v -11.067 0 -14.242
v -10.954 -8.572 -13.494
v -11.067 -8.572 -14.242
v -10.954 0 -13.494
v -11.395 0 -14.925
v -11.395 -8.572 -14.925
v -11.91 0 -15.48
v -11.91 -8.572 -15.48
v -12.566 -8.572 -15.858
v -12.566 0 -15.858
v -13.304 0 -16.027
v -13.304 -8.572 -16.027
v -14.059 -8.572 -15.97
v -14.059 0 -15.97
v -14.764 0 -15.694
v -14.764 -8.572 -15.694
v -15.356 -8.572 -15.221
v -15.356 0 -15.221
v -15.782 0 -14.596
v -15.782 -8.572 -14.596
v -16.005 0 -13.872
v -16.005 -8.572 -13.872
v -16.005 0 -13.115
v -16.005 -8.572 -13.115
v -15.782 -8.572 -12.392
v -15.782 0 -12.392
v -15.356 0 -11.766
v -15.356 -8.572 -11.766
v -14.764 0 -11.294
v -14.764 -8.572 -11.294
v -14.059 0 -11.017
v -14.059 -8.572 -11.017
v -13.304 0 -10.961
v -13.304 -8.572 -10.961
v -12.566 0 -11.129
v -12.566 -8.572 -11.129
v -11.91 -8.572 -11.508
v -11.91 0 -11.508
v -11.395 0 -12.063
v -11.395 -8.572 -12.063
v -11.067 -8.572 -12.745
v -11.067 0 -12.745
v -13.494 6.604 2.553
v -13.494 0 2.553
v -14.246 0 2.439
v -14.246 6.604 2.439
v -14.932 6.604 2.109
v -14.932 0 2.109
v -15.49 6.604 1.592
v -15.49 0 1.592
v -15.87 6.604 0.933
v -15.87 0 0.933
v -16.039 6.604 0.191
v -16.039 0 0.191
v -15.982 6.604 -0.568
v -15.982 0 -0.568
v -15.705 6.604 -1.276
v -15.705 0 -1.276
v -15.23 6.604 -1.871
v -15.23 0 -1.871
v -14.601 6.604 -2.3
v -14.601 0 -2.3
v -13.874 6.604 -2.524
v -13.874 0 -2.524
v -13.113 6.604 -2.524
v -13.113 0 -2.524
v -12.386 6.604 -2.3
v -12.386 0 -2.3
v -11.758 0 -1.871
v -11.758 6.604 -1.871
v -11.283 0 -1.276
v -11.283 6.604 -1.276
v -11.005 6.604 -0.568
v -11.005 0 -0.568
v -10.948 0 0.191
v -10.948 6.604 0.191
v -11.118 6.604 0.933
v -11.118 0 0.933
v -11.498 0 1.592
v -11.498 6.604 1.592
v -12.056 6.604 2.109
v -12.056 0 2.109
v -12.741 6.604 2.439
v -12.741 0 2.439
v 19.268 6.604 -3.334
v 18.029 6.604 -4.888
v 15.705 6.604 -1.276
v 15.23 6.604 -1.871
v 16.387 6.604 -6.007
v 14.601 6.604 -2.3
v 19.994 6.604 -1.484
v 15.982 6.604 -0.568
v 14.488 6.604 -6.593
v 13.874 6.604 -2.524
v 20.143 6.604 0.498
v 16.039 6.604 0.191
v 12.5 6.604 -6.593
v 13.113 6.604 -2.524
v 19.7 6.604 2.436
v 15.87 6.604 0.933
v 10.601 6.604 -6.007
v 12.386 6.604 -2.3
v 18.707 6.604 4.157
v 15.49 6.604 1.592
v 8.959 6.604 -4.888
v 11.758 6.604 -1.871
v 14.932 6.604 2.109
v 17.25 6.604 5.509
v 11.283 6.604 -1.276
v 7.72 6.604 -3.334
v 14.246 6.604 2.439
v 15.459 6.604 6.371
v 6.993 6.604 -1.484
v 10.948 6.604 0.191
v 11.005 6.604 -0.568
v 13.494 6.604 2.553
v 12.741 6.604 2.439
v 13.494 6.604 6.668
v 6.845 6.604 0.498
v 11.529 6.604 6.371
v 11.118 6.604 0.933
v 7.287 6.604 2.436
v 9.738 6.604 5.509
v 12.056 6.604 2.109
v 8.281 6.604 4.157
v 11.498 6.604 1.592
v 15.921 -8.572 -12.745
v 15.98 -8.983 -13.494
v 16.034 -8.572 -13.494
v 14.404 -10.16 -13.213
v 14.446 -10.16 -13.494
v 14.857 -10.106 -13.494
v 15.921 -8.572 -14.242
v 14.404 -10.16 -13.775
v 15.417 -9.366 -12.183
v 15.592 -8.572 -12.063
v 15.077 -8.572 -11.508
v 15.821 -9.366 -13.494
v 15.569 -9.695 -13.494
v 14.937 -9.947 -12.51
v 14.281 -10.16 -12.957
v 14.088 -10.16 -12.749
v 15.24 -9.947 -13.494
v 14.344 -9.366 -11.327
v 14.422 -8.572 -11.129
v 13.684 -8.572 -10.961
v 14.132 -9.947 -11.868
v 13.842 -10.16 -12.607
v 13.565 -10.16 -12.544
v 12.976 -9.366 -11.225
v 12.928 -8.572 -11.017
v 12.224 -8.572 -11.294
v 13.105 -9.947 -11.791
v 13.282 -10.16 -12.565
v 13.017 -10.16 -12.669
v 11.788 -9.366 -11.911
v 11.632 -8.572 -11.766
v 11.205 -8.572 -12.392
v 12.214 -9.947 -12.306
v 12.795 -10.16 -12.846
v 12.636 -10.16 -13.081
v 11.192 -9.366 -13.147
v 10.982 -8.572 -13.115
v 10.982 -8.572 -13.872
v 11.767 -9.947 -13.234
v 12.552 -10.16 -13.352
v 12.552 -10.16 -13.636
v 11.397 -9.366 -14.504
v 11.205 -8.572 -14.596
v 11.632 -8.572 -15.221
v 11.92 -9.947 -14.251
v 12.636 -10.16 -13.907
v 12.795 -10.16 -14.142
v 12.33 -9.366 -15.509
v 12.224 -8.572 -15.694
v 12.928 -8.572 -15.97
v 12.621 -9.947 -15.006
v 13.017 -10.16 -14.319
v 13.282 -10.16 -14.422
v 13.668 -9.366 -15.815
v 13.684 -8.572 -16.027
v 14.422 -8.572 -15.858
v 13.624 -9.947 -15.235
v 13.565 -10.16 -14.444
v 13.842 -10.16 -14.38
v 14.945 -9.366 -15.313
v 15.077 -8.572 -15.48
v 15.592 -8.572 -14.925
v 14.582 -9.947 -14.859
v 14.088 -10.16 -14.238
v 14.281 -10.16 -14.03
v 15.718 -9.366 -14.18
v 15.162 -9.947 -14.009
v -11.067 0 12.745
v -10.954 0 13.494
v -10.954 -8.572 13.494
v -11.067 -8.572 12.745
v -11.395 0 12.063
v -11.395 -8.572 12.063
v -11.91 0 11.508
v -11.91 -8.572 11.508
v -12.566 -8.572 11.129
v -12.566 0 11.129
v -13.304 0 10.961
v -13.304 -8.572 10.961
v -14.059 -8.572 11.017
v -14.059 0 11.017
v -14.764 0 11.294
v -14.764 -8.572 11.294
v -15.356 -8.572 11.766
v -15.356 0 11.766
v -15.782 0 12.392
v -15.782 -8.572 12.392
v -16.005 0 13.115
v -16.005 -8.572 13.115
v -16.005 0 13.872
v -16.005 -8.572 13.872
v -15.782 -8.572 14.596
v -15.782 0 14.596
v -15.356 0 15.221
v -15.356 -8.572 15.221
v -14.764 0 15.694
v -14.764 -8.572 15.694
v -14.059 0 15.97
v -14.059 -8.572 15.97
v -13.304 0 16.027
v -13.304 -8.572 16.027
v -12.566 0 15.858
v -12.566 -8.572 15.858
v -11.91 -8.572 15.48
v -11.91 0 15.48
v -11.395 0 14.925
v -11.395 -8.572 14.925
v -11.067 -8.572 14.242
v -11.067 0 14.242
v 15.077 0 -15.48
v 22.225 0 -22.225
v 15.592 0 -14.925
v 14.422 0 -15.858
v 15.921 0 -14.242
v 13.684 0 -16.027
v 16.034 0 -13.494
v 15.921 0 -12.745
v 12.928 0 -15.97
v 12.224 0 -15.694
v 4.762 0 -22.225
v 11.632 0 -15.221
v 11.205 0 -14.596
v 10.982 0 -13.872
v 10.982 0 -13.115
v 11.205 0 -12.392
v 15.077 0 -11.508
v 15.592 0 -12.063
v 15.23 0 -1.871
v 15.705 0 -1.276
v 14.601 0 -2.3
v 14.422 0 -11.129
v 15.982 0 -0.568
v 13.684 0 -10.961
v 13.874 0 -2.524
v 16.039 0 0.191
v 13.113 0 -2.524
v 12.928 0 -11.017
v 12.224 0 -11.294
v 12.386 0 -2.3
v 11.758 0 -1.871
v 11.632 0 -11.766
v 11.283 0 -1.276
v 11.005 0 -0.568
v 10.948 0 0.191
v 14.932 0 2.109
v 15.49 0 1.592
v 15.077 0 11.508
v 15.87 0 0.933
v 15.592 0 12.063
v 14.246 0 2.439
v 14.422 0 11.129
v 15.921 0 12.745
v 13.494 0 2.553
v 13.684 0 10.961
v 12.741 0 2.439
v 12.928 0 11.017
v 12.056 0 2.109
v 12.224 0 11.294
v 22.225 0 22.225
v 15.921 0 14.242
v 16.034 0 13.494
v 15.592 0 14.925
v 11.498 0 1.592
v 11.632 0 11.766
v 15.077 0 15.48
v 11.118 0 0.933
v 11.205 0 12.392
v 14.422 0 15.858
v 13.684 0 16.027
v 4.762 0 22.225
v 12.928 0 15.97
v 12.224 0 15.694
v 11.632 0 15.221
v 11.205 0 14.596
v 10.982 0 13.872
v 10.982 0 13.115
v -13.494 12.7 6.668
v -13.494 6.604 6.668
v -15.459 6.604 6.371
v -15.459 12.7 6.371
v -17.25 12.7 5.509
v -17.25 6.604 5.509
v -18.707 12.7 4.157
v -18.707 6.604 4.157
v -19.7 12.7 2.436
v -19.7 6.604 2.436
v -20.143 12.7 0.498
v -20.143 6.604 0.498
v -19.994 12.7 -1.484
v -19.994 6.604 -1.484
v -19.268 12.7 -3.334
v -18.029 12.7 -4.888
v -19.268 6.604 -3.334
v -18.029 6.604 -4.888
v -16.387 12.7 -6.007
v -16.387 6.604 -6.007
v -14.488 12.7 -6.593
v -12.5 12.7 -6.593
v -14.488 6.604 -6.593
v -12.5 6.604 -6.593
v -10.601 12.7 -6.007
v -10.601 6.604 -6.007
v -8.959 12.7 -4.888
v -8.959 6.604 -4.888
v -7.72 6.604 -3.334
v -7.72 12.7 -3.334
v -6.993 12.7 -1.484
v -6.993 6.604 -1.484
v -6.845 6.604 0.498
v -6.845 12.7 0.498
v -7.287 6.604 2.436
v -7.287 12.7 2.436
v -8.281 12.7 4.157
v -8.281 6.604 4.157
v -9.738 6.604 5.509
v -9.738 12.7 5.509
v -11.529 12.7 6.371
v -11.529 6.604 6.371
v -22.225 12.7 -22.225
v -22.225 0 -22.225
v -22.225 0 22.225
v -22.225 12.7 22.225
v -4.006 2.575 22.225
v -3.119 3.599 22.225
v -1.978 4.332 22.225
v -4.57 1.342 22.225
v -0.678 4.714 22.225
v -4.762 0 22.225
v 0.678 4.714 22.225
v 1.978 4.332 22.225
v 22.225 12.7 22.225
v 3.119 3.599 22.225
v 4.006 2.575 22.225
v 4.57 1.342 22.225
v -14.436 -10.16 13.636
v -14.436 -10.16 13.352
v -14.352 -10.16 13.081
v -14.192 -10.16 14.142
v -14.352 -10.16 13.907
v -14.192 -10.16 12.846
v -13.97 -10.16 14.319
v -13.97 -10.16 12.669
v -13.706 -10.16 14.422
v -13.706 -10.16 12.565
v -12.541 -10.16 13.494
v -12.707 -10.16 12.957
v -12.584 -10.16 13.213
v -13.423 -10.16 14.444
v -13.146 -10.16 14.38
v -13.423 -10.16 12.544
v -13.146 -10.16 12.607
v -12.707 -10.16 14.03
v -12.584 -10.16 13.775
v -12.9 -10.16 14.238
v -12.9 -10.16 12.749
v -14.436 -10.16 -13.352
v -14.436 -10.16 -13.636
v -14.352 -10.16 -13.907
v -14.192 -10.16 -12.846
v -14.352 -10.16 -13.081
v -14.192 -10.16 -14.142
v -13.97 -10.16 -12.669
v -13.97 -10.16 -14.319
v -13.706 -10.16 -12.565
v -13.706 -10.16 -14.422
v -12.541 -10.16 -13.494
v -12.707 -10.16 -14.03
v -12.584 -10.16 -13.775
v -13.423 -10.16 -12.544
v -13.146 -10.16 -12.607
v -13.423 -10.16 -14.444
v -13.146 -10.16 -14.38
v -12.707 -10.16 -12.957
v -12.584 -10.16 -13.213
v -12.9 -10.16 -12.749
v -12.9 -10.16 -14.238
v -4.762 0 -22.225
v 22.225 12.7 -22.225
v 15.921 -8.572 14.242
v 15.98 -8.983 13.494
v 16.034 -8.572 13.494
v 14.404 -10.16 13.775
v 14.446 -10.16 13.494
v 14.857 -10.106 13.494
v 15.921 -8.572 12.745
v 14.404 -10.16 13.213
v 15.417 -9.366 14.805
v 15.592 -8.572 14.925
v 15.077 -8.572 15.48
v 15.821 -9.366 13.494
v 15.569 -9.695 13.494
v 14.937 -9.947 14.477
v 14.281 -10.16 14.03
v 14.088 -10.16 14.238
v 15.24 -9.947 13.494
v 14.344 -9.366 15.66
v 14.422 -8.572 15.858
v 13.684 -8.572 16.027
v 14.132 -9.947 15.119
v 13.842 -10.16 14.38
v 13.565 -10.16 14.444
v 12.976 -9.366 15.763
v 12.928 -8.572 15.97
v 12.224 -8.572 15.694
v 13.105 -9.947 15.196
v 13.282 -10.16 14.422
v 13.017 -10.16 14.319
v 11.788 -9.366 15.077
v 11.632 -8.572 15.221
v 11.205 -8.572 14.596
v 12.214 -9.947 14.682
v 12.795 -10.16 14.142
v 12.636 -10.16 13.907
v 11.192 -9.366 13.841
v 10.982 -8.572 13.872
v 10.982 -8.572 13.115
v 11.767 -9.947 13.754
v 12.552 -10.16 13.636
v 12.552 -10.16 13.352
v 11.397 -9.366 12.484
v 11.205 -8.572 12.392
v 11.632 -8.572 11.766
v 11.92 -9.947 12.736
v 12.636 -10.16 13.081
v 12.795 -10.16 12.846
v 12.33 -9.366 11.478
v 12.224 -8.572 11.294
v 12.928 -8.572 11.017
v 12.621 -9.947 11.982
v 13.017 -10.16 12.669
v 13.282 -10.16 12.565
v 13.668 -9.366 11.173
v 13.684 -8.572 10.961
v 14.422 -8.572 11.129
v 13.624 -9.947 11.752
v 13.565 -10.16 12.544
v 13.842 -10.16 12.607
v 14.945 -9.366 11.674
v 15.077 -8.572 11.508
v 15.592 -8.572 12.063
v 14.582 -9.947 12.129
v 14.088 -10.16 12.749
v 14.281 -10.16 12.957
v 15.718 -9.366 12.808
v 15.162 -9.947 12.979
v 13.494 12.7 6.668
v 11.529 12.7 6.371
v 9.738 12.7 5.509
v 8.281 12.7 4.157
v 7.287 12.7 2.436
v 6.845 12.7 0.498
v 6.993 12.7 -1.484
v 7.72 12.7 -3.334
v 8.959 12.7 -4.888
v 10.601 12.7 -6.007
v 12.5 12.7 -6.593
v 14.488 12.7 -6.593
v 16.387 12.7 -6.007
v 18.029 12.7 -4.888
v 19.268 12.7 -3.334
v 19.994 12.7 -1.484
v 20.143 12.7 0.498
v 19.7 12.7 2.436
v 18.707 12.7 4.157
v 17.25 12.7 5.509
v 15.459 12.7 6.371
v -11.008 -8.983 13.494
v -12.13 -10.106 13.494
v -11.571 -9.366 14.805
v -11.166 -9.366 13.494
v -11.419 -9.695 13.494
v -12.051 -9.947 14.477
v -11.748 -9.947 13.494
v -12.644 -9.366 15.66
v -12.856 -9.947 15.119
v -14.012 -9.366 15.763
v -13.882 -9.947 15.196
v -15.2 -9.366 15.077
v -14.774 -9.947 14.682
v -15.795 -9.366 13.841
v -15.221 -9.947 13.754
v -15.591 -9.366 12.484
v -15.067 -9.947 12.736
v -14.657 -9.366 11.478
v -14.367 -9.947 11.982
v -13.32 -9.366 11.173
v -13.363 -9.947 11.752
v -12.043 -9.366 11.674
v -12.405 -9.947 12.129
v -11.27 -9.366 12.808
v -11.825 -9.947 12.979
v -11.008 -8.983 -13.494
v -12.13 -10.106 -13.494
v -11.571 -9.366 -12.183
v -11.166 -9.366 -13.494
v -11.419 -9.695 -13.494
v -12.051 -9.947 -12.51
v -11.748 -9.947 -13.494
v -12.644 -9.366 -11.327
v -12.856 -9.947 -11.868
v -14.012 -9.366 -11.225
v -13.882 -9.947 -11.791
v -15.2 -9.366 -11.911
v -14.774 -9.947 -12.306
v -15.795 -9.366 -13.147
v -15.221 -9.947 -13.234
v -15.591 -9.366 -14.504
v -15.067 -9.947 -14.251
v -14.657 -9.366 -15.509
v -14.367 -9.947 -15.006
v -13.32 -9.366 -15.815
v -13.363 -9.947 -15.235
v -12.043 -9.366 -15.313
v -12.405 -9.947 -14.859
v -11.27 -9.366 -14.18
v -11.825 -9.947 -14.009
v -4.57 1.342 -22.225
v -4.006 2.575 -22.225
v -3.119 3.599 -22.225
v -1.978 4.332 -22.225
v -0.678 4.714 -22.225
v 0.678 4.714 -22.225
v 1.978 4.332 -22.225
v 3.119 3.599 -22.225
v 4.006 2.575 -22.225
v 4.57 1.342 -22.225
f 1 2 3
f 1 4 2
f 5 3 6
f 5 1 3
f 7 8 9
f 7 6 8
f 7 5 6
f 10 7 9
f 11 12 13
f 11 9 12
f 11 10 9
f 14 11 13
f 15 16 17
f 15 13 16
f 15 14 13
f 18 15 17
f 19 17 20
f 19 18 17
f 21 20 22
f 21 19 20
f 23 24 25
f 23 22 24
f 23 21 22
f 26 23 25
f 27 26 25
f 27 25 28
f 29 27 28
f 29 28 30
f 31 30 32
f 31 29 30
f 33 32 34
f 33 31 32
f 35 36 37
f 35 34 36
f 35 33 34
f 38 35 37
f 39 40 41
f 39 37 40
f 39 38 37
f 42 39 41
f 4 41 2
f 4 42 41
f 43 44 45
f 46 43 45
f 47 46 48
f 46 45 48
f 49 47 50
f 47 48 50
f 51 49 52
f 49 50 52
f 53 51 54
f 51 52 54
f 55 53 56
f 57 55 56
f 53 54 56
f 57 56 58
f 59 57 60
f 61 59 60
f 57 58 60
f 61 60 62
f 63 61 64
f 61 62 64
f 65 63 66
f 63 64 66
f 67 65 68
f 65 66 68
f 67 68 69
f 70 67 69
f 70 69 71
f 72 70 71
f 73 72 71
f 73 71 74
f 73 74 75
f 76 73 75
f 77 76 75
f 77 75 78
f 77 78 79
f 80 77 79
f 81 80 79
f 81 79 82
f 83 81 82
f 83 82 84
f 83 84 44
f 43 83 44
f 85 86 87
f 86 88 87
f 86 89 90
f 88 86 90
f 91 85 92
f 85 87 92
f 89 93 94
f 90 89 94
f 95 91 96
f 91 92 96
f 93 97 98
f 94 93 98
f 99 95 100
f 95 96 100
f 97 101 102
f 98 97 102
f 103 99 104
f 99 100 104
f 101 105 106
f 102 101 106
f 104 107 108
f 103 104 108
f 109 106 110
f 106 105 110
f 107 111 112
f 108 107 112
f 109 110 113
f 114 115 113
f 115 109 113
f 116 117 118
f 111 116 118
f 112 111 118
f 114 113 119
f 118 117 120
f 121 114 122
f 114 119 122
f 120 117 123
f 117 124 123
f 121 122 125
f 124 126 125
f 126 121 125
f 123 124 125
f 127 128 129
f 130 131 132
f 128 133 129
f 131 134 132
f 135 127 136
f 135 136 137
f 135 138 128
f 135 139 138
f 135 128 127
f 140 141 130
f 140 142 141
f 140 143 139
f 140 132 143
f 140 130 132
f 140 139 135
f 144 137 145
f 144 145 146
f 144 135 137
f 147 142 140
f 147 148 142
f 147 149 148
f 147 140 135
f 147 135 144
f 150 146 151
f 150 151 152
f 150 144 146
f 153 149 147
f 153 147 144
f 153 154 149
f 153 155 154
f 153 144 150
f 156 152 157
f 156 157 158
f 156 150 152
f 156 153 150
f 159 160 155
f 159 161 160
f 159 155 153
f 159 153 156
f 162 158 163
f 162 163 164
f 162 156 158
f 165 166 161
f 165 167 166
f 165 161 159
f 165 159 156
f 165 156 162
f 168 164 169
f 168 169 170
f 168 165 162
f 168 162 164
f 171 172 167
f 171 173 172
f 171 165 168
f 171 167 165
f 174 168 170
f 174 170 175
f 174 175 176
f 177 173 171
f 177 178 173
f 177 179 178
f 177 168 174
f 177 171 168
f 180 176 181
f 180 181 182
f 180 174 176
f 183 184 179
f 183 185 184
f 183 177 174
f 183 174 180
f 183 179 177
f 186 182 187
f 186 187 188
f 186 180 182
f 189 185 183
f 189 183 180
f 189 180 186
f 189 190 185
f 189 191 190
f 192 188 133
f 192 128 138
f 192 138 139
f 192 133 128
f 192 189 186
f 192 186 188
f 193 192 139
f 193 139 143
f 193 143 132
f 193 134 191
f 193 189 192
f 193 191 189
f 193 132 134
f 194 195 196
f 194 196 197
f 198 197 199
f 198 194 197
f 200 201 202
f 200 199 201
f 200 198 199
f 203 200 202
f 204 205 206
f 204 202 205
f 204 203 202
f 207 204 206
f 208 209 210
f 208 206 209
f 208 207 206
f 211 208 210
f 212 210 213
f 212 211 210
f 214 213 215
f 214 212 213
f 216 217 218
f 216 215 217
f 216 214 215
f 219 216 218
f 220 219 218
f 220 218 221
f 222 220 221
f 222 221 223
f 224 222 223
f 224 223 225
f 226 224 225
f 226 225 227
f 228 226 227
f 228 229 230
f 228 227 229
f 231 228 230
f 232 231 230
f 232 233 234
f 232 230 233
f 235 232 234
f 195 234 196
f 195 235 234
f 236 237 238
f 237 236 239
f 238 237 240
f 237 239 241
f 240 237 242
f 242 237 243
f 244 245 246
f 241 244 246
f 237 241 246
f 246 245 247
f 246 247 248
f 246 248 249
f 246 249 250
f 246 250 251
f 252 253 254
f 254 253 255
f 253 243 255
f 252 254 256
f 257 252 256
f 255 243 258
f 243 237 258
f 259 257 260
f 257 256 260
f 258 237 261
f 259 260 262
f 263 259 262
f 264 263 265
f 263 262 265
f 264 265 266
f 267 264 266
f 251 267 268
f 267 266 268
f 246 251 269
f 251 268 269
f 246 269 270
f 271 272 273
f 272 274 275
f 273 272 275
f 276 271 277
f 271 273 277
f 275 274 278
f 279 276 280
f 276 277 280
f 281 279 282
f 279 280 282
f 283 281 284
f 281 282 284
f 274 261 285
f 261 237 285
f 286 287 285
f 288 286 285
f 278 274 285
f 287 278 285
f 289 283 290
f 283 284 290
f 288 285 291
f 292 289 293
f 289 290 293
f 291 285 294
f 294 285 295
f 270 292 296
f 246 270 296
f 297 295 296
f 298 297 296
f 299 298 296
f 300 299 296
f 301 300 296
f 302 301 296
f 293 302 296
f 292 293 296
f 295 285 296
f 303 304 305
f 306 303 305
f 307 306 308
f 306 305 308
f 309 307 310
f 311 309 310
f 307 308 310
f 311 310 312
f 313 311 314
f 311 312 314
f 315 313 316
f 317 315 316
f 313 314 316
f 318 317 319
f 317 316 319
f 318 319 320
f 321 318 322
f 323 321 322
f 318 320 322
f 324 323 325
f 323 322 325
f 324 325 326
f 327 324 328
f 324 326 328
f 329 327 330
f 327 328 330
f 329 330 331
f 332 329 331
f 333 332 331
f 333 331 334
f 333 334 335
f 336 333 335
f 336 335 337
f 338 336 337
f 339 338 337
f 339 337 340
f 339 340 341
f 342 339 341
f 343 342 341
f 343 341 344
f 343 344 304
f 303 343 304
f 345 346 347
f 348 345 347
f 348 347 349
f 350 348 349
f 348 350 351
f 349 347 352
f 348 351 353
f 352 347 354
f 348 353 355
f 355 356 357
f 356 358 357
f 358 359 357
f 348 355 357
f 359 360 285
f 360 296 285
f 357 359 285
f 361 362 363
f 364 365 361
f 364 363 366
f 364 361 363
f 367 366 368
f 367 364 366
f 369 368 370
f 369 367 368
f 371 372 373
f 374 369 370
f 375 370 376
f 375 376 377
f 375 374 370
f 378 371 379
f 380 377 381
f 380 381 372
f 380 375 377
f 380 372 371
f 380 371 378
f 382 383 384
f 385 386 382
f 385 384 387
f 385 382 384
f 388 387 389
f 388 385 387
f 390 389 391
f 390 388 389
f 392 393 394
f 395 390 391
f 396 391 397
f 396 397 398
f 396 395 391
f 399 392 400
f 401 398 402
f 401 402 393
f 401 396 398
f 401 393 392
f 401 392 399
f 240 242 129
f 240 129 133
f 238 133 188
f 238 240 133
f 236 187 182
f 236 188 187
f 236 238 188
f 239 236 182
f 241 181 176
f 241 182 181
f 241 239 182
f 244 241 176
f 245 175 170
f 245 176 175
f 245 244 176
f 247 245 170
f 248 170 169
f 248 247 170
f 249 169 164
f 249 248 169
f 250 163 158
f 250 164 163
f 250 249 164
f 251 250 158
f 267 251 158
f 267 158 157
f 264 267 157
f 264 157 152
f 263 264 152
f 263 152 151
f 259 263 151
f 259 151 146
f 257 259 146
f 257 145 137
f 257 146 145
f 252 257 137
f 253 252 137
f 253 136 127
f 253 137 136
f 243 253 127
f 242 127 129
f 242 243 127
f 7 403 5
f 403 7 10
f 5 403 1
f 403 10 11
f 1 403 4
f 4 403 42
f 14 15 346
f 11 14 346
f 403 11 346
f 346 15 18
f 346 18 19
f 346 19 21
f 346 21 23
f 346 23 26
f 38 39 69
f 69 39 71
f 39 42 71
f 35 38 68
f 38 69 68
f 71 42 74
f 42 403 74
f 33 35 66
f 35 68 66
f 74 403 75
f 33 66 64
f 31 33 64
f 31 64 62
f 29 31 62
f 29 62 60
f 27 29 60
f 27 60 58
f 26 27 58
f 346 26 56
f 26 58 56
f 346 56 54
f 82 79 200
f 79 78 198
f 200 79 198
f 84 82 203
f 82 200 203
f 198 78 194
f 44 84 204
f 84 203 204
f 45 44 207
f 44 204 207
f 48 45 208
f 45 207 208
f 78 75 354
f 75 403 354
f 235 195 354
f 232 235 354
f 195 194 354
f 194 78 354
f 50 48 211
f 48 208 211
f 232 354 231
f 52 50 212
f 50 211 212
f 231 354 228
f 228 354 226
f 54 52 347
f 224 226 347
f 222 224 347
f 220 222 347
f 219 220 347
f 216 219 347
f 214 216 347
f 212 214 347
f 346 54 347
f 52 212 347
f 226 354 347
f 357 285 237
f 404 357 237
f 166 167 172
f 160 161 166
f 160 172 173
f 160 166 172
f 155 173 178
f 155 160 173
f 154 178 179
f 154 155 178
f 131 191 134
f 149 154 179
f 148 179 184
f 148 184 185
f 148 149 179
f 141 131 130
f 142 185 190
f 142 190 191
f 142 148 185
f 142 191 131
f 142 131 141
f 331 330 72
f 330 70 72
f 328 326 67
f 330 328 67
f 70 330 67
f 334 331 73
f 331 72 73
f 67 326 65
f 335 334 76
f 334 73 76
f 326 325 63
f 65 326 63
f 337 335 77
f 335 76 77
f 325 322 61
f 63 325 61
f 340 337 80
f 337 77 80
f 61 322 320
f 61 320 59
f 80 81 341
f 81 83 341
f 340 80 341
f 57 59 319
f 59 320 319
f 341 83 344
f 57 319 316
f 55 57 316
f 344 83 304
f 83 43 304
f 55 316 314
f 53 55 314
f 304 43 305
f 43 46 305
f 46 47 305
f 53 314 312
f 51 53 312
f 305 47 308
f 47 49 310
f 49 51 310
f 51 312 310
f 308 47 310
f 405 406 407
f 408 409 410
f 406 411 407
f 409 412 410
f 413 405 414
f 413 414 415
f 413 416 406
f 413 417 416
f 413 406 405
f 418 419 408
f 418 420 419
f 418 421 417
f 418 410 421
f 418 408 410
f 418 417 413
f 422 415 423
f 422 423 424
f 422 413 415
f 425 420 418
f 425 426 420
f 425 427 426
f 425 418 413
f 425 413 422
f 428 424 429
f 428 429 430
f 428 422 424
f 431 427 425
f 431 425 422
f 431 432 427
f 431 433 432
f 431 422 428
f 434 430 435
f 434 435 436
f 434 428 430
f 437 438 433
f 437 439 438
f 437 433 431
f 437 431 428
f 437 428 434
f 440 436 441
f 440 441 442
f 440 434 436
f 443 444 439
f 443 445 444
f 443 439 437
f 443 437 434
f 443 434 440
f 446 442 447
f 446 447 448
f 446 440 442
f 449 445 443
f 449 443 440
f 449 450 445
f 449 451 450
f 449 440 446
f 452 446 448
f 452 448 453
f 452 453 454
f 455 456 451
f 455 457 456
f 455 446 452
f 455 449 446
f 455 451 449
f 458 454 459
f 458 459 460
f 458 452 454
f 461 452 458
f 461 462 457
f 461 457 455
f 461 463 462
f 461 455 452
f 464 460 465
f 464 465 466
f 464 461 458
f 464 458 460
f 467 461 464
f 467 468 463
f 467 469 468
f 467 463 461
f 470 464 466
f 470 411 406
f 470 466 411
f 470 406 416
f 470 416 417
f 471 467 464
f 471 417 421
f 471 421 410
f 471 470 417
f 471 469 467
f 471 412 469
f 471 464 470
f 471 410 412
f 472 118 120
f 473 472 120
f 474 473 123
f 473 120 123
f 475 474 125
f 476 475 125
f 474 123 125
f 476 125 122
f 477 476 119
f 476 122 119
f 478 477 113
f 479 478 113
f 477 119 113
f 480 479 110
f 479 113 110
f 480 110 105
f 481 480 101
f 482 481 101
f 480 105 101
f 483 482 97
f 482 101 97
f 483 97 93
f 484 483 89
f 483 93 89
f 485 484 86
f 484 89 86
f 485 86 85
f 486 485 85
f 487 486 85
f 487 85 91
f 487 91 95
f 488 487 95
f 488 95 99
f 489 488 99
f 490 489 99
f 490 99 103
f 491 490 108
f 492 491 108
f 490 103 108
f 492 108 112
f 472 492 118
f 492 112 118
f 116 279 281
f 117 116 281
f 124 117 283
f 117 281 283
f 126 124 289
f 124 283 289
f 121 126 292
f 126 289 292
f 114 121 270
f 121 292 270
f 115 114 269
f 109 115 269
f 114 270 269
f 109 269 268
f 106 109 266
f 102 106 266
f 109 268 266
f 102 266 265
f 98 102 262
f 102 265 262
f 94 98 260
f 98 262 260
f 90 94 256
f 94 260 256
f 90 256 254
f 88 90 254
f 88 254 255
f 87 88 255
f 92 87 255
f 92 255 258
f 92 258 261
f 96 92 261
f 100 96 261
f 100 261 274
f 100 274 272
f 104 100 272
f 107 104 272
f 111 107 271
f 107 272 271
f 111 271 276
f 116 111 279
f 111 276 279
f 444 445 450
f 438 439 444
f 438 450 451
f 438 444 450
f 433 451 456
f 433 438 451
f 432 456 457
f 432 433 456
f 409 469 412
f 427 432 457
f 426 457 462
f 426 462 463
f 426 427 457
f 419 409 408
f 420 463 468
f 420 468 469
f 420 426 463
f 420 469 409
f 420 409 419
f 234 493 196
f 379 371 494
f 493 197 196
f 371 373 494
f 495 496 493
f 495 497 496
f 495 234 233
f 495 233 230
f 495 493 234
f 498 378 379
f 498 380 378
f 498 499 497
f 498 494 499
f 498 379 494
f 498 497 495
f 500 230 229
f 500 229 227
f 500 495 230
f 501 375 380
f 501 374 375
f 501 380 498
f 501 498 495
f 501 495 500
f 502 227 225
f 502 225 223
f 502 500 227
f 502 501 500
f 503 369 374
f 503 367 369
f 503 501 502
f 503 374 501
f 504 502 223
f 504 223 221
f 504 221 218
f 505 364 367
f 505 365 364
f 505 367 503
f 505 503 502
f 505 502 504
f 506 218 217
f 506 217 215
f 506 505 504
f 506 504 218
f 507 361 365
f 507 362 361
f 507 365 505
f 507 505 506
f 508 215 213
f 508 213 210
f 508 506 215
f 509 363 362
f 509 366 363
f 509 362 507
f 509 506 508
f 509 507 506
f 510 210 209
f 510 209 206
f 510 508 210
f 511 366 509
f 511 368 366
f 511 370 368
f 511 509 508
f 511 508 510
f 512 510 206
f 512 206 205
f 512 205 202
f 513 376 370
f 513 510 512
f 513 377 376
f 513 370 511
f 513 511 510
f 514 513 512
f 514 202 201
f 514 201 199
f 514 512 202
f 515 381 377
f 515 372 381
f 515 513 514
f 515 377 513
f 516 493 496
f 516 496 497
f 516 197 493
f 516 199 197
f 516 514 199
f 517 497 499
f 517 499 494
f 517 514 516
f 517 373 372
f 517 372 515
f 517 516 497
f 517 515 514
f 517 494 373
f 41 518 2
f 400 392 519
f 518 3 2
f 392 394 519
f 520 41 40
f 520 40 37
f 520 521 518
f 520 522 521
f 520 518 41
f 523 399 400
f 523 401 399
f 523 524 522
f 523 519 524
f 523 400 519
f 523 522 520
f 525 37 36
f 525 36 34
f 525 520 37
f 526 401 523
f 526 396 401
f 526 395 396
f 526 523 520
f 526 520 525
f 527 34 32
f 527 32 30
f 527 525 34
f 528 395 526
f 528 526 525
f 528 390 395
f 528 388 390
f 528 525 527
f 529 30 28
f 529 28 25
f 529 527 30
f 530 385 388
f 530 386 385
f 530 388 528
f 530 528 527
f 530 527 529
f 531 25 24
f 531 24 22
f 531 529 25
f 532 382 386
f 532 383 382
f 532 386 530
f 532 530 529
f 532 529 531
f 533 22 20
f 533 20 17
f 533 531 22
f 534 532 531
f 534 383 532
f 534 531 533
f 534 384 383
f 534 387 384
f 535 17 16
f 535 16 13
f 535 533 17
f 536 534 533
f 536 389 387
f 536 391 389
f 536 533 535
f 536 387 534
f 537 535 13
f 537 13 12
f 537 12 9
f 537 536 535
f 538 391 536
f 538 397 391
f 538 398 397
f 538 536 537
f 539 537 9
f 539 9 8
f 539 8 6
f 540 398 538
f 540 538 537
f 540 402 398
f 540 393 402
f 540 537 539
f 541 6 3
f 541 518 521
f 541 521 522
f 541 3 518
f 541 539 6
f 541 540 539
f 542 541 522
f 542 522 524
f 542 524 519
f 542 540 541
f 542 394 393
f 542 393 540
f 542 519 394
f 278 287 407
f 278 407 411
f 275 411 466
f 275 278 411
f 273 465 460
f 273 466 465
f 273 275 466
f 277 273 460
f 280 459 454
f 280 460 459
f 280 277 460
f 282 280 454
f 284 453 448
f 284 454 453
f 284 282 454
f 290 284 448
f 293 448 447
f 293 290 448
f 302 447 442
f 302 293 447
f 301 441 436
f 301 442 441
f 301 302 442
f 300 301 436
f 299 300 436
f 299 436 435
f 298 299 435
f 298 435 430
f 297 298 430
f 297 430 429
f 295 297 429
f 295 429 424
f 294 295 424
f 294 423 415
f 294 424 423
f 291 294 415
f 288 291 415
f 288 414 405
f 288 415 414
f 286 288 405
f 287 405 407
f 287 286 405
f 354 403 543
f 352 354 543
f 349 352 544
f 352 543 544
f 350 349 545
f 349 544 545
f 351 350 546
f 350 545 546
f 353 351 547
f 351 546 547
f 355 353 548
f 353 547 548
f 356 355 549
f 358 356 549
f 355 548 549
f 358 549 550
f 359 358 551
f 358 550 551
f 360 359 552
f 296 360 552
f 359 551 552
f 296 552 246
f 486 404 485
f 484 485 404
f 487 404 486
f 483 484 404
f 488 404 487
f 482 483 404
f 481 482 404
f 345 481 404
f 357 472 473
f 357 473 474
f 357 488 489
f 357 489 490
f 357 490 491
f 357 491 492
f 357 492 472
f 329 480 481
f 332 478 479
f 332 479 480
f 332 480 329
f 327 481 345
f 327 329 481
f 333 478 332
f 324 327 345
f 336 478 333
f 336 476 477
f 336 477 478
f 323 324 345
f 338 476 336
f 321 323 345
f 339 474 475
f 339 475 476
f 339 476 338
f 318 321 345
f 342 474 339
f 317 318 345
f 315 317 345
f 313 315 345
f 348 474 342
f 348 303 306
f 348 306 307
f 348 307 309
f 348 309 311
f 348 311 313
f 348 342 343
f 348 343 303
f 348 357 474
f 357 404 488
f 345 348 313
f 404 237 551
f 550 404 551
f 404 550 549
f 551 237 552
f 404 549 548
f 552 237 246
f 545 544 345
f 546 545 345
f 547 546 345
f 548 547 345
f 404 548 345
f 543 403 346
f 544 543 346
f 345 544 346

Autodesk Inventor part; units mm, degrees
ref_plane "YZ Plane" through (0, 0, 0) normal (1, 0, 0) x (0, 1, 0)
ref_plane "XZ Plane" through (0, 0, 0) normal (0, 1, 0) x (-1, 0, 0)
ref_plane "XY Plane" through (0, 0, 0) normal (0, 0, 1) x (1, 0, 0)
sketch "Sketch5" plane through (0, 0, 0) normal (0, 1, 0) x (-1, 0, 0)
  line L0 (-22.225, 22.225) -> (-22.225, -22.225)
  line L1 (-22.225, -22.225) -> (22.225, -22.225)
  line L2 (22.225, -22.225) -> (22.225, 22.225)
  line L3 (22.225, 22.225) -> (-22.225, 22.225)
  line L4 (-22.225, 22.225) -> (22.225, -22.225) construction
  line L5 (-22.225, -22.225) -> (22.225, 22.225) construction
  point P0 (0, 0)
  dimension "d23" = 44.45
extrude "Extrusion3" add sketch "Sketch5" along normal blind 12.7
sketch "Sketch6" plane through (-22.225, 0, 22.225) normal (0, 0, 1) x (1, 0, 0)
  point P0 (22.225, 0)
  point P1 (22.225, 0)
hole "Hole2" at (0, 0, 22.225) direction (0, 0, -1) diameter 9.525 end through all
sketch "Sketch7" plane through (0, 12.7, 0) normal (0, 1, 0) x (1, 0, 0)
  line L0 (-22.225, 22.225) -> (-22.225, -22.225) projected
  line L1 (22.225, -22.225) -> (22.225, 22.225) projected
  line L2 (-22.225, -22.225) -> (22.225, -22.225) projected
  point P0 (0, 0)
  point P1 (-13.4938, 0)
  point P2 (13.4938, 0)
  dimension "d33" = 8.7312
  dimension "d34" = 8.7312
  dimension "d53" = 22.225
  dimension "d54" = 22.225
hole "Hole3" at (-13.4938, 12.7, 0) at (13.4938, 12.7, 0) direction (0, -1, 0) diameter 13.335 depth 6.096
sketch "Sketch8" plane through (0, 12.7, 0) normal (0, 1, 0) x (1, 0, 0)
  line L0 (-22.225, 22.225) -> (-22.225, -22.225) projected
  line L1 (22.225, -22.225) -> (22.225, 22.225) projected
  line L2 (-22.225, -22.225) -> (22.225, -22.225) projected
  point P0 (0, 0)
  point P1 (-13.4938, 0)
  point P2 (13.4938, 0)
  dimension "d42" = 8.7312
  dimension "d43" = 8.7312
  dimension "d51" = 22.225
  dimension "d52" = 22.225
hole "Hole4" at (-13.4938, 12.7, 0) at (13.4938, 12.7, 0) direction (0, -1, 0) diameter 5.1054 end through all clearance for "Flat Head Machine Screw (82)" size "#10" standard "Ansi Unified Screw Threads"
sketch "Sketch9" plane through (0, 0, 0) normal (0, -1, 0) x (1, 0, 0)
  line L0 (-13.4938, -13.4938) -> (13.4937, -13.4938) construction
  line L1 (13.4937, -13.4938) -> (13.4937, 13.4938) construction
  line L2 (13.4937, 13.4938) -> (-13.4938, 13.4938) construction
  line L3 (-13.4938, 13.4938) -> (-13.4938, -13.4938) construction
  line L4 (-13.4938, -13.4938) -> (13.4937, 13.4938) construction
  line L5 (13.4937, -13.4938) -> (-13.4938, 13.4938) construction
  line L6 (-4.7625, -22.225) -> (-22.225, -22.225) construction
  line L7 (-22.225, -22.225) -> (-22.225, 22.225) construction
  circle A0 centre (-13.4938, -13.4938) radius 2.54
  circle A1 centre (13.4937, -13.4938) radius 2.54
  circle A2 centre (13.4937, 13.4938) radius 2.54
  circle A3 centre (-13.4938, 13.4938) radius 2.54
  point P0 (0, 0)
  dimension "d55" = 8.7312
  dimension "d56" = 8.7312
  dimension "d57" = 5.08
extrude "Extrusion4" add sketch "Sketch9" along normal blind 10.16
fillet "Fillet1" radius 1.5875 4 edges at (-16.0338, -10.16, 13.4938) (10.9537, -10.16, 13.4938) (10.9537, -10.16, -13.4938) (-16.0338, -10.16, -13.4938)
equation "\"d23\" = basewidth"
equation "\"d24\" = heightOfTopSection"
equation "\"d26\" = topHoleDiam"
equation "\"d33\" = edgeToBoltHole"
equation "\"d34\" = edgeToBoltHole"
equation "\"d53\" = 0.5 * basewidth"
equation "\"d54\" = 0.5 * basewidth"
equation "\"d35\" = washerDiam"
equation "\"d40\" = depthForSocketHead"
equation "\"d42\" = edgeToBoltHole"
equation "\"d43\" = edgeToBoltHole"
equation "\"d51\" = 0.5 * basewidth"
equation "\"d52\" = 0.5 * basewidth"
equation "\"d55\" = edgeToBoltHole"
equation "\"d56\" = edgeToBoltHole"
equation "\"d57\" = supportHoleDiam"
equation "\"d58\" = supportHoleLength"
equation "\"bottomHoleDiam\" = 9.525"
equation "\"basewidth\" = 44.45"
equation "\"deltaBottomToTop\" = 25.4"
equation "\"d0\" = basewidth"
equation "\"d1\" = heightOfBottomHole"
equation "\"d2\" = 0"
equation "\"d3\" = bottomHoleDiam"
equation "\"d5\" = 0"
equation "\"topHoleDiam\" = 9.525"
equation "\"height\" = deltaBottomToTop + heightOfBottomHole + heightOfTopHole"
equation "\"heightOfTopSection\" = 12.7"
equation "\"edgeToBoltHole\" = -0.25 * bottomHoleDiam + 0.25 * basewidth"
equation "\"washerDiam\" = 13.335"
equation "\"depthForSocketHead\" = 6.096"
equation "\"heightOfTopSupport\" = 12.7"
equation "\"baseLength\" = 44.45"
equation "\"supportHoleDiam\" = 5.08"
equation "\"supportHoleLength\" = 10.16"
equation "\"heightOfBottomHole\" = 11.1125"
equation "\"heightOfTopHole\" = 11.1125"
properties part number "TopOfSquareSupport" material "PC/ABS Plastic"
